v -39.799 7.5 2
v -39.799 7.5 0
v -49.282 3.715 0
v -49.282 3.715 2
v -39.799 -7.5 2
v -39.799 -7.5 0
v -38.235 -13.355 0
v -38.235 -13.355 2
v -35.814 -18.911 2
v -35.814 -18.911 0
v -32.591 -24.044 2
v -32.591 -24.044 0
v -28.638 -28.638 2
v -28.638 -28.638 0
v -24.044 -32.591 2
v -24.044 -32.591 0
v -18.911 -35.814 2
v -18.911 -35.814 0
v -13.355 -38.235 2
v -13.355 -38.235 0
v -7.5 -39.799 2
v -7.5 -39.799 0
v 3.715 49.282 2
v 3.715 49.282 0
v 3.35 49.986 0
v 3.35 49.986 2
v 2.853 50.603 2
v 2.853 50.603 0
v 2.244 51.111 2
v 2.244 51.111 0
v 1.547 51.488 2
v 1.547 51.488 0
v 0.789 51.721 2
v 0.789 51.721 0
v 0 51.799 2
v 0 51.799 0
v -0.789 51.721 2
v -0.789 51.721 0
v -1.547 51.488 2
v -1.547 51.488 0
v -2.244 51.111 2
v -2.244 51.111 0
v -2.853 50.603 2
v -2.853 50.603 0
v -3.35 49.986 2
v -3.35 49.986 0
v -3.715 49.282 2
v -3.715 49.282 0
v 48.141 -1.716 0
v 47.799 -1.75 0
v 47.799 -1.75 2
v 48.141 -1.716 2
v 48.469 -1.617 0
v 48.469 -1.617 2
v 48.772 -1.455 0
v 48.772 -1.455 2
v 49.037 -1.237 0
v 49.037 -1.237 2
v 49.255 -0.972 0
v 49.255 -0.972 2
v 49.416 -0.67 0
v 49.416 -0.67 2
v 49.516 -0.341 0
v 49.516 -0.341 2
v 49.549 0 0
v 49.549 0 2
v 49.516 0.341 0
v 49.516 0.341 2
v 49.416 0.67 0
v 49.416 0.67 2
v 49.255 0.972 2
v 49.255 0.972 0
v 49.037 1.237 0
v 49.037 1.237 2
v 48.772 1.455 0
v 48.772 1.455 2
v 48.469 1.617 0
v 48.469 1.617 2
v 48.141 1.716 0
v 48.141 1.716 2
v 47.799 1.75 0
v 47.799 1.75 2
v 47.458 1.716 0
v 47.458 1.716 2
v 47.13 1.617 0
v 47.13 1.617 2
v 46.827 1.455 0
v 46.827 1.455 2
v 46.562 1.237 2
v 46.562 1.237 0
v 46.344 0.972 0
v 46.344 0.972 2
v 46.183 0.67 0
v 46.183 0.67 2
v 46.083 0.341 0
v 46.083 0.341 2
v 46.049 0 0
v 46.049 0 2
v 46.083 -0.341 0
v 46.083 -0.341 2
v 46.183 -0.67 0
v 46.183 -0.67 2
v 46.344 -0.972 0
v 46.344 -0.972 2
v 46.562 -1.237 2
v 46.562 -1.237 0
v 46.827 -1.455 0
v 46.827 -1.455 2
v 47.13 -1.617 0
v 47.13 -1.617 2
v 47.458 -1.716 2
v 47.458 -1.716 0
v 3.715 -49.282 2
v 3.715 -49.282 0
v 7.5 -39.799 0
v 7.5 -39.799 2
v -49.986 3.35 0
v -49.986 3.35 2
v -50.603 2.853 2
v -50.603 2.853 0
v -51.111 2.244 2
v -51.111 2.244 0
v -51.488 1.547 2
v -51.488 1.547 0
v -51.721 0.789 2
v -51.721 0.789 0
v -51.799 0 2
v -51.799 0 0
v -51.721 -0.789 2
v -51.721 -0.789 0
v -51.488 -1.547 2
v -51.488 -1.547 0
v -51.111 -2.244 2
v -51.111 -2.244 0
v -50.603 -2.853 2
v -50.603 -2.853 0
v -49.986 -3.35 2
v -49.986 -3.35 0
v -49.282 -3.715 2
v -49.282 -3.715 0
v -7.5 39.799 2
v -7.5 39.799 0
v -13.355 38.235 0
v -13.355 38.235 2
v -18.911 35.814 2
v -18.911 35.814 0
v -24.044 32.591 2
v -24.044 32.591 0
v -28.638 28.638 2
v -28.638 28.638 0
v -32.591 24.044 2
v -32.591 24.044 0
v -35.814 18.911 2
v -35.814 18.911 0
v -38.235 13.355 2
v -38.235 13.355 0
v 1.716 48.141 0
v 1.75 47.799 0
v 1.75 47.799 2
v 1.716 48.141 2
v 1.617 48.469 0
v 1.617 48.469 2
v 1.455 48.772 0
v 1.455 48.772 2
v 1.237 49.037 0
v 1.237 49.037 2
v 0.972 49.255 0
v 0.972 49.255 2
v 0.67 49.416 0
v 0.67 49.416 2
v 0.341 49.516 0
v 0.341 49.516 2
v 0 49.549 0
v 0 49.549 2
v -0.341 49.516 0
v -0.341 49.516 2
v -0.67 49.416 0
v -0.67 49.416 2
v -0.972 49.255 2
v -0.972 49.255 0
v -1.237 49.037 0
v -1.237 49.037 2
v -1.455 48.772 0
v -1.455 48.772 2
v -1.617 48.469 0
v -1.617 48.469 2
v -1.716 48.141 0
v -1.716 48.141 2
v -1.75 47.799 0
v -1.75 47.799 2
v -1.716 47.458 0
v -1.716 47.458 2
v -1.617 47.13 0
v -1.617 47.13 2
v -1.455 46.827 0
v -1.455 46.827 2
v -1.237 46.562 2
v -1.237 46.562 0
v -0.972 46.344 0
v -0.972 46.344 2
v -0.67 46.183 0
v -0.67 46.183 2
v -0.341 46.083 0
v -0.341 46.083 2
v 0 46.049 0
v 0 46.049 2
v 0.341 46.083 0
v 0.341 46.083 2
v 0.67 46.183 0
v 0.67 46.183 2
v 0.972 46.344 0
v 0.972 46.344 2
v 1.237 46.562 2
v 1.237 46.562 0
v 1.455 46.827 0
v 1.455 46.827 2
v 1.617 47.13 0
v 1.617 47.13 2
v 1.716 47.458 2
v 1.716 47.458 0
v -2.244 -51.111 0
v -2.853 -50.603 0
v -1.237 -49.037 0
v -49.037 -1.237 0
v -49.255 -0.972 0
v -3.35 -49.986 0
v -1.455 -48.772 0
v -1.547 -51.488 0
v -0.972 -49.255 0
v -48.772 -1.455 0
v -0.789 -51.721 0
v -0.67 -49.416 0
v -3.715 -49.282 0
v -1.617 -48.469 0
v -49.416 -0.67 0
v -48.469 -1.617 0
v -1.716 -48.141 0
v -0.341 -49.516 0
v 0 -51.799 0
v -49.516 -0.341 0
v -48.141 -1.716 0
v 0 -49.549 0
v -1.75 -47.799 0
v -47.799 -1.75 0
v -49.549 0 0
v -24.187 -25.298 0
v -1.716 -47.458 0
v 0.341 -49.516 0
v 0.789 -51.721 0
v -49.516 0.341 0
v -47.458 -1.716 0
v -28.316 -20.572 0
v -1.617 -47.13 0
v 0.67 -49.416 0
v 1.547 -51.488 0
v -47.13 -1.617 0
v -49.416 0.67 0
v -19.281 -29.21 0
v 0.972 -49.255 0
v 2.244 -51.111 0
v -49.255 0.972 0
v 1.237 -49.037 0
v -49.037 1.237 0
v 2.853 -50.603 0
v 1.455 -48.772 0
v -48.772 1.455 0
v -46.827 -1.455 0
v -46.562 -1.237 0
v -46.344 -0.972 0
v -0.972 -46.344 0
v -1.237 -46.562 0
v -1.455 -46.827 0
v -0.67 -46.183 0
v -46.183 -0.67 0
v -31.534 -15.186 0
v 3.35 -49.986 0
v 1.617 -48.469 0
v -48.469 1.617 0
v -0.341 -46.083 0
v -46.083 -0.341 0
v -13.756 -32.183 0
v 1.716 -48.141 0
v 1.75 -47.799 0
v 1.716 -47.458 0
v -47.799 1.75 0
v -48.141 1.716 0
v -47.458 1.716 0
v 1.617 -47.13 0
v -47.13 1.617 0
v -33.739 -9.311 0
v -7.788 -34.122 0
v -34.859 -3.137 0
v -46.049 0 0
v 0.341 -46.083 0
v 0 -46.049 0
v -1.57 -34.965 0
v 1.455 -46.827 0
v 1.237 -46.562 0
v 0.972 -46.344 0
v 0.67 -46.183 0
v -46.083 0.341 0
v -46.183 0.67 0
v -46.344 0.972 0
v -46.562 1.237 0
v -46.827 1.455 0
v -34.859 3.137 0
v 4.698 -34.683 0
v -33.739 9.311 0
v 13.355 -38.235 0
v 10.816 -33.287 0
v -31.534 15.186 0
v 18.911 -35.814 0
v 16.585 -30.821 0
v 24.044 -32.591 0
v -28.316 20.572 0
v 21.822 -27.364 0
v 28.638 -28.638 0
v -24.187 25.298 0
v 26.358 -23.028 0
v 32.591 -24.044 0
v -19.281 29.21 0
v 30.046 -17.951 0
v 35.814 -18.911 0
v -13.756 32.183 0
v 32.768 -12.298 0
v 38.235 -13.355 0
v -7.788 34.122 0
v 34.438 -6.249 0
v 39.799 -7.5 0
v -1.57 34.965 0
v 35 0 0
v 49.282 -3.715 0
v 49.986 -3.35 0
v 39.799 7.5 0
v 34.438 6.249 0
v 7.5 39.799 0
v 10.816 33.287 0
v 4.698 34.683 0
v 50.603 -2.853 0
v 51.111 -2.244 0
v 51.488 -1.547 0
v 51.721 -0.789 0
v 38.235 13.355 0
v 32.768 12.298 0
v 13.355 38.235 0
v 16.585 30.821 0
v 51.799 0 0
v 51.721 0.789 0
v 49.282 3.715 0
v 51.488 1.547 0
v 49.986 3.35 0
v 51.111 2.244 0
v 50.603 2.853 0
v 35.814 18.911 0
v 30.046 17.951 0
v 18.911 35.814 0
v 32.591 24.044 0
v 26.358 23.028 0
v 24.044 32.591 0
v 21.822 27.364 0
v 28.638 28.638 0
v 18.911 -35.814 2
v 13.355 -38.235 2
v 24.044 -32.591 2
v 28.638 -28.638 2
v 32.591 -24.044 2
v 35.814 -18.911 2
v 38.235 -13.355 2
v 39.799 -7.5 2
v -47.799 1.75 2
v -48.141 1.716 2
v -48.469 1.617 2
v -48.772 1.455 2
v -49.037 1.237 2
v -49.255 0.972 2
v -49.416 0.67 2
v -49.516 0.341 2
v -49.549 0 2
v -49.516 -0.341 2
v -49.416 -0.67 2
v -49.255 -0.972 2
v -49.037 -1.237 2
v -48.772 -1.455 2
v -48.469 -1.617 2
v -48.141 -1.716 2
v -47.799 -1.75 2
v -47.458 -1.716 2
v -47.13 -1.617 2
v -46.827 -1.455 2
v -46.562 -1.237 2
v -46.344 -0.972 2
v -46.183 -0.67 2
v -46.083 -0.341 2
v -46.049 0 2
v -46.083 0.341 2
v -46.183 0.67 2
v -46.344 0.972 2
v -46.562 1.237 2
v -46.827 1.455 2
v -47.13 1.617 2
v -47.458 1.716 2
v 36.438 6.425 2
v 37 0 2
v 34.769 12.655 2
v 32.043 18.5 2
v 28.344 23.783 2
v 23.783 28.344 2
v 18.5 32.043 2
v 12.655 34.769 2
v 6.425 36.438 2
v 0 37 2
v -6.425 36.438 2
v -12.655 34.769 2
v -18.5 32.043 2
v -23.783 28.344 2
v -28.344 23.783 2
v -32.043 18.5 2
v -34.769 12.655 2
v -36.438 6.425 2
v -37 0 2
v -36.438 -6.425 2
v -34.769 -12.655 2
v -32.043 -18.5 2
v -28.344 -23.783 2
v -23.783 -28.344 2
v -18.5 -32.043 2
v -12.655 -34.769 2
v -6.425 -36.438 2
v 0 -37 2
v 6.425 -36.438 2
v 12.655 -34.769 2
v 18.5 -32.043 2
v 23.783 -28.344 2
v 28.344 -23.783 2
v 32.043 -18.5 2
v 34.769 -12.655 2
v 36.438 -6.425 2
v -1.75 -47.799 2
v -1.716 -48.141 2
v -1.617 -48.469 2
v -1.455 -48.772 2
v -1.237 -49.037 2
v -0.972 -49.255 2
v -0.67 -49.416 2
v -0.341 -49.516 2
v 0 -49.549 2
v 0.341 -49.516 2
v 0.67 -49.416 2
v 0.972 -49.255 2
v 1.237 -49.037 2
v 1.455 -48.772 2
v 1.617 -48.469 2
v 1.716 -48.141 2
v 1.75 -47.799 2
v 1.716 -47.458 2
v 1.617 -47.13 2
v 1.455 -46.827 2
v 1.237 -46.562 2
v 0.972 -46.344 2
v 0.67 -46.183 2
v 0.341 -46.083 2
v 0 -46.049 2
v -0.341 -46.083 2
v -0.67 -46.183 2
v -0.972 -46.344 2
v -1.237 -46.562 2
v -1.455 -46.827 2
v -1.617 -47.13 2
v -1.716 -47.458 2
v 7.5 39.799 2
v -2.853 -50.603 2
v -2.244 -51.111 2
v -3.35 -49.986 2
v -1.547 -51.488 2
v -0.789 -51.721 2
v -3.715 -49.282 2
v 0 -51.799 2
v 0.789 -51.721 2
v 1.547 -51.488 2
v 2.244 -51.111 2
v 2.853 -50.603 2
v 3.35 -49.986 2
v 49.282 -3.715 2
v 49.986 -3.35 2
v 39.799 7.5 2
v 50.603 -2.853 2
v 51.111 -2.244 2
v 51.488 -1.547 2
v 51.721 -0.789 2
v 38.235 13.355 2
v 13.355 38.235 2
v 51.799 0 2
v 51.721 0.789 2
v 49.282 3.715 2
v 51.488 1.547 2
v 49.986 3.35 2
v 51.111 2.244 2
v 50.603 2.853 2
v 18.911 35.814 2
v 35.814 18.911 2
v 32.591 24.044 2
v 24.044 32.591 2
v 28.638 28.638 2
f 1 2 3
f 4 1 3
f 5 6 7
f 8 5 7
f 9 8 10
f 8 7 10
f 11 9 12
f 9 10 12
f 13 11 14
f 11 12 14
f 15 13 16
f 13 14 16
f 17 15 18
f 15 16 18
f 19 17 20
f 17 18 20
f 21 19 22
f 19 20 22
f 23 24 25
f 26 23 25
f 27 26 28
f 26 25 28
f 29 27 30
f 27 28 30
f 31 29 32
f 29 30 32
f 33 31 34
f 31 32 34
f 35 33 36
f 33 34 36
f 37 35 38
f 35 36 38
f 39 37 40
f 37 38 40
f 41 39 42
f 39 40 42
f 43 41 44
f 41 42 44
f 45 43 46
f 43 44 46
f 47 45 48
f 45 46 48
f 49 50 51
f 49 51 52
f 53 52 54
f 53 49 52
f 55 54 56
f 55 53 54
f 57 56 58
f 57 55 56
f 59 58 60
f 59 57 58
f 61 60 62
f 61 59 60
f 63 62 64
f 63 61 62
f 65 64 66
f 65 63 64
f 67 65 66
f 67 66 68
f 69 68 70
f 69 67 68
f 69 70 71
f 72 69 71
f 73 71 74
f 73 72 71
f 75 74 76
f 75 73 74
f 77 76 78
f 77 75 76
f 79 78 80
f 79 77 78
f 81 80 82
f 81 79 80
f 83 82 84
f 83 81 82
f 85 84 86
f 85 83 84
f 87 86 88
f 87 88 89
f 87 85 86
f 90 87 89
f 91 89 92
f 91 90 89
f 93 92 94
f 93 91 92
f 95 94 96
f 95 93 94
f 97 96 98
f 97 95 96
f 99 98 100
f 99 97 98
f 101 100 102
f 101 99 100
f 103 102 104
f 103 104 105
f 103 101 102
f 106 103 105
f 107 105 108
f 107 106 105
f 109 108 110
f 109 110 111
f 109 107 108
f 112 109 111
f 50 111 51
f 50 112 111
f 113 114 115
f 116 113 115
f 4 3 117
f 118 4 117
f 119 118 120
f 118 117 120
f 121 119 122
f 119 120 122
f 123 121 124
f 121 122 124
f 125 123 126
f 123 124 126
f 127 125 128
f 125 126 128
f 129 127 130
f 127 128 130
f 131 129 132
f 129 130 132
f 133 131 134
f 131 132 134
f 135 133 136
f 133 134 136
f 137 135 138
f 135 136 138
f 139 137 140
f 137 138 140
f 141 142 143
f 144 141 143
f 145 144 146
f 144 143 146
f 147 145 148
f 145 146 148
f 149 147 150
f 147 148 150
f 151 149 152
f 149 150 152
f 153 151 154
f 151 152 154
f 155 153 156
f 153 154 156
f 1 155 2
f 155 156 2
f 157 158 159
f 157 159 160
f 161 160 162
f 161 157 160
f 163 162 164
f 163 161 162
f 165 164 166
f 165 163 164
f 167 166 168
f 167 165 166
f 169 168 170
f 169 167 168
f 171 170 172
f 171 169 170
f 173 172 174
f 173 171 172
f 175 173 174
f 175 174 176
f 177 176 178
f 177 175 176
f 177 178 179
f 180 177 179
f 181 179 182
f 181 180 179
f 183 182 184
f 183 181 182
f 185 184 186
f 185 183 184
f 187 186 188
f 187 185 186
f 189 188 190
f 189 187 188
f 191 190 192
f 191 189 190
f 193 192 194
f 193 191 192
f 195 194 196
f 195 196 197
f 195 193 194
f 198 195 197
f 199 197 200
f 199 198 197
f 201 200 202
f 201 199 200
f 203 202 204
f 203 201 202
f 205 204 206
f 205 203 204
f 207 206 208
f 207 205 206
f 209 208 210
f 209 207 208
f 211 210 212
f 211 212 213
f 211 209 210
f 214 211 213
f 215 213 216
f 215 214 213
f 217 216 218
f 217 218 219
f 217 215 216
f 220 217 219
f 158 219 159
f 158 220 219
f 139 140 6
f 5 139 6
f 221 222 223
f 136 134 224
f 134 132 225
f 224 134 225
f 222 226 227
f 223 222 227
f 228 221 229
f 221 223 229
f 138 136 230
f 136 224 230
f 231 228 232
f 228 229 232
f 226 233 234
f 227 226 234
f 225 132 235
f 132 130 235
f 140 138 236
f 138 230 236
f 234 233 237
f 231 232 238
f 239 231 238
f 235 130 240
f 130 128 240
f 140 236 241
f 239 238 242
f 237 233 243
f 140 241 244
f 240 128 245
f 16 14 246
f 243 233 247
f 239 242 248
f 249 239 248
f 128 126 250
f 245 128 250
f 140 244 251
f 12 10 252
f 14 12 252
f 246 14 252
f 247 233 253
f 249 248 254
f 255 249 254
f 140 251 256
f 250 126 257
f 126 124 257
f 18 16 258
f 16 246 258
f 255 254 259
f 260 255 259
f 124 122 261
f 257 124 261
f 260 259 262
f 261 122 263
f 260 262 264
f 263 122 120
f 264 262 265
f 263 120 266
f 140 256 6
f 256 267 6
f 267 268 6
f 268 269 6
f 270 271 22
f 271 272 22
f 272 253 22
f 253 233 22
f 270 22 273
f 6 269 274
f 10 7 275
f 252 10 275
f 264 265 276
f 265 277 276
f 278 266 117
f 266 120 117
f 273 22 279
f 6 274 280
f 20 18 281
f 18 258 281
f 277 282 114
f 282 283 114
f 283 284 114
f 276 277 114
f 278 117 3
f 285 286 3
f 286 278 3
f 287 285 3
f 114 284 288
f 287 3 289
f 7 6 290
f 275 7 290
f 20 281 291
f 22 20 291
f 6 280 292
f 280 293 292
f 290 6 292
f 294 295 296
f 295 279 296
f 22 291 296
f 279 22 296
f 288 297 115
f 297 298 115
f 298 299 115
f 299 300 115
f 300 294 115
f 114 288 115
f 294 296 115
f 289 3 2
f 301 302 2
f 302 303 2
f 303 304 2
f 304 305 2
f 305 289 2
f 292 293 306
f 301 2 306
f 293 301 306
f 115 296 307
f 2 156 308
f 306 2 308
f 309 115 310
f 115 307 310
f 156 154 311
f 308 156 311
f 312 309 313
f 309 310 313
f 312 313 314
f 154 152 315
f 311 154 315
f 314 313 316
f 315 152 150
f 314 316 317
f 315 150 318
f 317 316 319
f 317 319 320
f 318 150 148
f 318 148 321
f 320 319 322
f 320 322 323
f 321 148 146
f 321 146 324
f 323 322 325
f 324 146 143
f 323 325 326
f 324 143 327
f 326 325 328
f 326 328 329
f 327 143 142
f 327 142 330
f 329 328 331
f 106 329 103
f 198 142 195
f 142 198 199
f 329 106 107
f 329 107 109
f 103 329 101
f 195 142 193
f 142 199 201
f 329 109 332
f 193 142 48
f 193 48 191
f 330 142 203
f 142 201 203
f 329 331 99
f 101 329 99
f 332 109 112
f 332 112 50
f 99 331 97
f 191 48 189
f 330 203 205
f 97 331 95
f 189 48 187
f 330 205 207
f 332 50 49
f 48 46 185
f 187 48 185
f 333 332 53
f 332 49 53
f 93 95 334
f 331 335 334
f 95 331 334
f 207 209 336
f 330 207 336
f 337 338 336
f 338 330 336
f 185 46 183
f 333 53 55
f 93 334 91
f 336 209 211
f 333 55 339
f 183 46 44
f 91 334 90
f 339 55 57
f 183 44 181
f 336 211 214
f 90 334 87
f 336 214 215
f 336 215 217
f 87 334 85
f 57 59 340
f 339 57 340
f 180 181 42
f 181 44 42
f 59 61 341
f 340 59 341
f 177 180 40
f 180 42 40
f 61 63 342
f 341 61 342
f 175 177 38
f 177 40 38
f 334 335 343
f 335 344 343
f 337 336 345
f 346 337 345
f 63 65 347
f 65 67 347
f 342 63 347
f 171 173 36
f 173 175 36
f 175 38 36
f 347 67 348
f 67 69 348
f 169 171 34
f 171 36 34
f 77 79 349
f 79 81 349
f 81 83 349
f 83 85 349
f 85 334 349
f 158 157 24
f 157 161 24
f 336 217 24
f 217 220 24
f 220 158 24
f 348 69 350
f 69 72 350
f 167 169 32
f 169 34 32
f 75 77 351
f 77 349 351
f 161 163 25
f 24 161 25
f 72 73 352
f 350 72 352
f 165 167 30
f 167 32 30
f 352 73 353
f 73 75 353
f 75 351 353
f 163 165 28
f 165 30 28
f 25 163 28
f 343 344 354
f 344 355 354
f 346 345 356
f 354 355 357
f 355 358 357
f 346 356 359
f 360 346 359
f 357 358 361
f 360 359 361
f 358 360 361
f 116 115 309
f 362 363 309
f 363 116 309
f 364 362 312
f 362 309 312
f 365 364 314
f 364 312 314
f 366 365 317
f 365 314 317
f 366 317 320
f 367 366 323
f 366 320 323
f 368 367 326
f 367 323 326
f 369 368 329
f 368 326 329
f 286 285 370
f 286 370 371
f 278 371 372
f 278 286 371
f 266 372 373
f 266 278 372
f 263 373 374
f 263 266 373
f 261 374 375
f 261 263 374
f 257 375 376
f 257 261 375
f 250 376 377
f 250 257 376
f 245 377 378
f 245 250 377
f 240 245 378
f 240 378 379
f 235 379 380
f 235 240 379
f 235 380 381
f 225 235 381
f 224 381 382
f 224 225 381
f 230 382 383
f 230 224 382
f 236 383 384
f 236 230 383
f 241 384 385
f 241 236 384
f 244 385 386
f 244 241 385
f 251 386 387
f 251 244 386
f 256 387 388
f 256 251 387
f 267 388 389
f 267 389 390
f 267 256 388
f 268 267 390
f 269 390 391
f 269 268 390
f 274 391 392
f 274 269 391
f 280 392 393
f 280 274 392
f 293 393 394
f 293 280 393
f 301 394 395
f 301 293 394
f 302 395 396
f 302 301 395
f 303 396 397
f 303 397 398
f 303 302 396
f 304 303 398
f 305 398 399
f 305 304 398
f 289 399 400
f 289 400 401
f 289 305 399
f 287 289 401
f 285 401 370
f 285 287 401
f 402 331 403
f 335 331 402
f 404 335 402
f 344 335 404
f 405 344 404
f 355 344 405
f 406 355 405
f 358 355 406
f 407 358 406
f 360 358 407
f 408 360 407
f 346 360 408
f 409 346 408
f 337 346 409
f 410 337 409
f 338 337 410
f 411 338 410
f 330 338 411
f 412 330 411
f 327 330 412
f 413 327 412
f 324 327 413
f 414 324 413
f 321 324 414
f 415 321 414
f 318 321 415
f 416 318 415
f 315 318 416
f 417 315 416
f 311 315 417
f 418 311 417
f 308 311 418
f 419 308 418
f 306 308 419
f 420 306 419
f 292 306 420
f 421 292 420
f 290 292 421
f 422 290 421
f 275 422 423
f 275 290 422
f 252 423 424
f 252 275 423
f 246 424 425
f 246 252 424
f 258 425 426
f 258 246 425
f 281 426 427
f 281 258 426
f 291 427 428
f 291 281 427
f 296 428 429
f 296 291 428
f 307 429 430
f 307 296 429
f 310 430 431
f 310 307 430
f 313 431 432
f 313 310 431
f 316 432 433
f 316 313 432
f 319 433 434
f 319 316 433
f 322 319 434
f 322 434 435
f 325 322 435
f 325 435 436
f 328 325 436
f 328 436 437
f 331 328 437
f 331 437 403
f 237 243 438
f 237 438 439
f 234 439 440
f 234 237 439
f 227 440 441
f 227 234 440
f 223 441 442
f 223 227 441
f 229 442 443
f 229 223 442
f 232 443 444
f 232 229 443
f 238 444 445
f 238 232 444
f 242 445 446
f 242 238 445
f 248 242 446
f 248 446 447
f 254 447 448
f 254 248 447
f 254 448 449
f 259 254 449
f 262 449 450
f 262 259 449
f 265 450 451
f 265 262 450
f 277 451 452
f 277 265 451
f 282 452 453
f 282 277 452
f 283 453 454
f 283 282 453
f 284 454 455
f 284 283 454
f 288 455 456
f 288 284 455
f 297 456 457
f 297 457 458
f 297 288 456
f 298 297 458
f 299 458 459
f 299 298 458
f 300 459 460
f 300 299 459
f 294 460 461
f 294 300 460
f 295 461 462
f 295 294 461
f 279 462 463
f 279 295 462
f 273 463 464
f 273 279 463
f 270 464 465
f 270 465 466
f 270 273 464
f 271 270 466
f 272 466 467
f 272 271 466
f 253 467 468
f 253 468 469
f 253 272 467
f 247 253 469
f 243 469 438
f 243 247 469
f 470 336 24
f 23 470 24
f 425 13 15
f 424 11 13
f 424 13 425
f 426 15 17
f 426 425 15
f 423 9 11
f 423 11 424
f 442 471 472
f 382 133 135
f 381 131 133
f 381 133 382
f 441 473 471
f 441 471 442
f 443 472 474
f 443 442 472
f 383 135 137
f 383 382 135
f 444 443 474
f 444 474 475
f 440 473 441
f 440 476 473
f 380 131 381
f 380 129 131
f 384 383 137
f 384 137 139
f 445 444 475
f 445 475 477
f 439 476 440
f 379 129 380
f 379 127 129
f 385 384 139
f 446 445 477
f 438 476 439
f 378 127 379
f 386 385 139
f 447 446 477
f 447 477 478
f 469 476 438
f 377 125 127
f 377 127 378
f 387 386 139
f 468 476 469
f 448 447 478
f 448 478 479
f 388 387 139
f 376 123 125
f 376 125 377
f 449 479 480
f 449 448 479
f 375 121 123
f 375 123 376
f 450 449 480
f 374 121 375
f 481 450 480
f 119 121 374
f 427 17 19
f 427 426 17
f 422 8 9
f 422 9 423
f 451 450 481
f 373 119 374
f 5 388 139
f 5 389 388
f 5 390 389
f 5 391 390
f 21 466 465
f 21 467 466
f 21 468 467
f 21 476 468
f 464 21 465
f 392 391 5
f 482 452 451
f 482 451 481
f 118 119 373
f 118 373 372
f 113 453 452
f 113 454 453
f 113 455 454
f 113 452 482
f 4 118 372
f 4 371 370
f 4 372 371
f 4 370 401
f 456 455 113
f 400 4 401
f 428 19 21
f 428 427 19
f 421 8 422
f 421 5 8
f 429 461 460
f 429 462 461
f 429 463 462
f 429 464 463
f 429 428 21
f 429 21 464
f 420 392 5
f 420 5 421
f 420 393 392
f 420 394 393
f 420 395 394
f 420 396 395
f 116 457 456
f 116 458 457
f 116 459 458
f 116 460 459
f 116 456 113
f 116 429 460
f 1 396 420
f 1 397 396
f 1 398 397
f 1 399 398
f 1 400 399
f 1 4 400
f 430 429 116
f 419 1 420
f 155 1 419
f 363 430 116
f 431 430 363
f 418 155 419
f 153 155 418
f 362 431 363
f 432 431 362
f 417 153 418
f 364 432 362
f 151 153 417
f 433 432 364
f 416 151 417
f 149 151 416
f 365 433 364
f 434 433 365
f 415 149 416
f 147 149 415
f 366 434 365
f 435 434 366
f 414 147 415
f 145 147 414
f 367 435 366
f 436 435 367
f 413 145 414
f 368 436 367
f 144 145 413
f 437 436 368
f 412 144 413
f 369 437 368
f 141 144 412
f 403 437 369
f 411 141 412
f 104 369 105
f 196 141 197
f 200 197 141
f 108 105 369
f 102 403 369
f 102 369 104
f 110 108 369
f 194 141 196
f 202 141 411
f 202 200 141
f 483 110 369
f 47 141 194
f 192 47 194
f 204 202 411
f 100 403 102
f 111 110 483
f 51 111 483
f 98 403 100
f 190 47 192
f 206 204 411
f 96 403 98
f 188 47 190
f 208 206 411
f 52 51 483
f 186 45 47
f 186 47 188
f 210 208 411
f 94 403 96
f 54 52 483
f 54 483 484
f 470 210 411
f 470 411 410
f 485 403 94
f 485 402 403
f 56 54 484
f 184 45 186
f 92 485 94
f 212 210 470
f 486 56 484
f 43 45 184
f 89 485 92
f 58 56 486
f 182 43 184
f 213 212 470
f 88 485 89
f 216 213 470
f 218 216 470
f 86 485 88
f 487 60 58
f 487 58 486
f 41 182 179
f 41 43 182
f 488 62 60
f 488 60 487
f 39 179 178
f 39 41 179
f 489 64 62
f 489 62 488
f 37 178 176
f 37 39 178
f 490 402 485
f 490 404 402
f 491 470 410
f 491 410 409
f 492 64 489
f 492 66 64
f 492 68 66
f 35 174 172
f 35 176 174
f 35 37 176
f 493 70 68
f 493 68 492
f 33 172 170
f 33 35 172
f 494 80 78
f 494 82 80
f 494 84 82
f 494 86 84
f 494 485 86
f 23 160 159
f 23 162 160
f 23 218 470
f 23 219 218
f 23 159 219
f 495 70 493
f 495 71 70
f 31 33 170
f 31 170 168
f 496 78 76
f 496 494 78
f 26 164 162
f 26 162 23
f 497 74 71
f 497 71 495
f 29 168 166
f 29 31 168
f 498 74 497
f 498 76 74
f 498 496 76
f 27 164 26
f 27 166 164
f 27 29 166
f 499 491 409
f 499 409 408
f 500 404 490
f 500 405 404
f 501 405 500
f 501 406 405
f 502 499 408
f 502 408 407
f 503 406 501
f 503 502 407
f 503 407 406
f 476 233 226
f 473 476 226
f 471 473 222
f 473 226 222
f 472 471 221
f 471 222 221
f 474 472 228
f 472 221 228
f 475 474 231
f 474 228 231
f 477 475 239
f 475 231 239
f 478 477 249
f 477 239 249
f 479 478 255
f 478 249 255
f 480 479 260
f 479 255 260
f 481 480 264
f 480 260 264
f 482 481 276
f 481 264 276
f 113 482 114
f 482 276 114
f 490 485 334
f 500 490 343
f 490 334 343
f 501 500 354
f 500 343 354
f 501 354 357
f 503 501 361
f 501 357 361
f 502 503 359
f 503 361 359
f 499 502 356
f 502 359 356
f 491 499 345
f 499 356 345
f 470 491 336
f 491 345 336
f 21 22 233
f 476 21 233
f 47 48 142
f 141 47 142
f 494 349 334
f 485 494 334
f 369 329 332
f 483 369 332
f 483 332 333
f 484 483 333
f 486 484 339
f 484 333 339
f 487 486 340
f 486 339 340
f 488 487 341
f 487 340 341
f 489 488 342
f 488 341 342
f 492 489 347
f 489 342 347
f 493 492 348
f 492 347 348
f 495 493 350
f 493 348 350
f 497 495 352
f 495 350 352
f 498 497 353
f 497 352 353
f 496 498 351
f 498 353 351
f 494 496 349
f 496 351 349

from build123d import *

# Parameters (mm, degrees)
SKETCH1_R           = 40.5
SKETCH1_R_2         = 35
BOSS_EXTRUDE1_DEPTH = 2
SKETCH2_R           = 1.75
BOSS_EXTRUDE2_DEPTH = 2
CIRPATTERN1_COUNT   = 4
CHAMFER1_SIZE       = 2


with BuildPart() as part:
    # Sketch1 → Boss-Extrude1 (new body)
    with BuildSketch(Plane.XY):
        Circle(SKETCH1_R)
        Circle(SKETCH1_R_2, mode=Mode.SUBTRACT)
    extrude(amount=BOSS_EXTRUDE1_DEPTH)

    # Sketch2 → Boss-Extrude2 (add)
    with BuildSketch(Plane.XY):
        with BuildLine():
            Line((7.5, 39.799497484), (3.715004122, 49.282313849))
            ThreePointArc((3.715004122, 49.282313849), (0, 51.799497484), (-3.715004122, 49.282313849))
            Line((-3.715004122, 49.282313849), (-7.5, 39.799497484))
            ThreePointArc((-7.5, 39.799497484), (0, 40.5), (7.5, 39.799497484))
        make_face()
        with Locations((0, 47.799497484)):
            Circle(SKETCH2_R, mode=Mode.SUBTRACT)
    boss_extrude2 = extrude(amount=BOSS_EXTRUDE2_DEPTH)

    # CirPattern1: Boss-Extrude2 ×4 about axis
    cirpattern1_axis = Axis((0, 0, 0), (0, 0, 1))
    for i in range(1, CIRPATTERN1_COUNT):
        add(boss_extrude2.rotate(cirpattern1_axis, i * 360 / CIRPATTERN1_COUNT))

    # Chamfer1
    chamfer1_edges = [part.edges().sort_by_distance(p)[0] for p in [
        (-35, 0, 2),
    ]]
    chamfer(chamfer1_edges, length=CHAMFER1_SIZE - 0.0001)  # a hair under: the kernel refuses the full size


solid = part.part
